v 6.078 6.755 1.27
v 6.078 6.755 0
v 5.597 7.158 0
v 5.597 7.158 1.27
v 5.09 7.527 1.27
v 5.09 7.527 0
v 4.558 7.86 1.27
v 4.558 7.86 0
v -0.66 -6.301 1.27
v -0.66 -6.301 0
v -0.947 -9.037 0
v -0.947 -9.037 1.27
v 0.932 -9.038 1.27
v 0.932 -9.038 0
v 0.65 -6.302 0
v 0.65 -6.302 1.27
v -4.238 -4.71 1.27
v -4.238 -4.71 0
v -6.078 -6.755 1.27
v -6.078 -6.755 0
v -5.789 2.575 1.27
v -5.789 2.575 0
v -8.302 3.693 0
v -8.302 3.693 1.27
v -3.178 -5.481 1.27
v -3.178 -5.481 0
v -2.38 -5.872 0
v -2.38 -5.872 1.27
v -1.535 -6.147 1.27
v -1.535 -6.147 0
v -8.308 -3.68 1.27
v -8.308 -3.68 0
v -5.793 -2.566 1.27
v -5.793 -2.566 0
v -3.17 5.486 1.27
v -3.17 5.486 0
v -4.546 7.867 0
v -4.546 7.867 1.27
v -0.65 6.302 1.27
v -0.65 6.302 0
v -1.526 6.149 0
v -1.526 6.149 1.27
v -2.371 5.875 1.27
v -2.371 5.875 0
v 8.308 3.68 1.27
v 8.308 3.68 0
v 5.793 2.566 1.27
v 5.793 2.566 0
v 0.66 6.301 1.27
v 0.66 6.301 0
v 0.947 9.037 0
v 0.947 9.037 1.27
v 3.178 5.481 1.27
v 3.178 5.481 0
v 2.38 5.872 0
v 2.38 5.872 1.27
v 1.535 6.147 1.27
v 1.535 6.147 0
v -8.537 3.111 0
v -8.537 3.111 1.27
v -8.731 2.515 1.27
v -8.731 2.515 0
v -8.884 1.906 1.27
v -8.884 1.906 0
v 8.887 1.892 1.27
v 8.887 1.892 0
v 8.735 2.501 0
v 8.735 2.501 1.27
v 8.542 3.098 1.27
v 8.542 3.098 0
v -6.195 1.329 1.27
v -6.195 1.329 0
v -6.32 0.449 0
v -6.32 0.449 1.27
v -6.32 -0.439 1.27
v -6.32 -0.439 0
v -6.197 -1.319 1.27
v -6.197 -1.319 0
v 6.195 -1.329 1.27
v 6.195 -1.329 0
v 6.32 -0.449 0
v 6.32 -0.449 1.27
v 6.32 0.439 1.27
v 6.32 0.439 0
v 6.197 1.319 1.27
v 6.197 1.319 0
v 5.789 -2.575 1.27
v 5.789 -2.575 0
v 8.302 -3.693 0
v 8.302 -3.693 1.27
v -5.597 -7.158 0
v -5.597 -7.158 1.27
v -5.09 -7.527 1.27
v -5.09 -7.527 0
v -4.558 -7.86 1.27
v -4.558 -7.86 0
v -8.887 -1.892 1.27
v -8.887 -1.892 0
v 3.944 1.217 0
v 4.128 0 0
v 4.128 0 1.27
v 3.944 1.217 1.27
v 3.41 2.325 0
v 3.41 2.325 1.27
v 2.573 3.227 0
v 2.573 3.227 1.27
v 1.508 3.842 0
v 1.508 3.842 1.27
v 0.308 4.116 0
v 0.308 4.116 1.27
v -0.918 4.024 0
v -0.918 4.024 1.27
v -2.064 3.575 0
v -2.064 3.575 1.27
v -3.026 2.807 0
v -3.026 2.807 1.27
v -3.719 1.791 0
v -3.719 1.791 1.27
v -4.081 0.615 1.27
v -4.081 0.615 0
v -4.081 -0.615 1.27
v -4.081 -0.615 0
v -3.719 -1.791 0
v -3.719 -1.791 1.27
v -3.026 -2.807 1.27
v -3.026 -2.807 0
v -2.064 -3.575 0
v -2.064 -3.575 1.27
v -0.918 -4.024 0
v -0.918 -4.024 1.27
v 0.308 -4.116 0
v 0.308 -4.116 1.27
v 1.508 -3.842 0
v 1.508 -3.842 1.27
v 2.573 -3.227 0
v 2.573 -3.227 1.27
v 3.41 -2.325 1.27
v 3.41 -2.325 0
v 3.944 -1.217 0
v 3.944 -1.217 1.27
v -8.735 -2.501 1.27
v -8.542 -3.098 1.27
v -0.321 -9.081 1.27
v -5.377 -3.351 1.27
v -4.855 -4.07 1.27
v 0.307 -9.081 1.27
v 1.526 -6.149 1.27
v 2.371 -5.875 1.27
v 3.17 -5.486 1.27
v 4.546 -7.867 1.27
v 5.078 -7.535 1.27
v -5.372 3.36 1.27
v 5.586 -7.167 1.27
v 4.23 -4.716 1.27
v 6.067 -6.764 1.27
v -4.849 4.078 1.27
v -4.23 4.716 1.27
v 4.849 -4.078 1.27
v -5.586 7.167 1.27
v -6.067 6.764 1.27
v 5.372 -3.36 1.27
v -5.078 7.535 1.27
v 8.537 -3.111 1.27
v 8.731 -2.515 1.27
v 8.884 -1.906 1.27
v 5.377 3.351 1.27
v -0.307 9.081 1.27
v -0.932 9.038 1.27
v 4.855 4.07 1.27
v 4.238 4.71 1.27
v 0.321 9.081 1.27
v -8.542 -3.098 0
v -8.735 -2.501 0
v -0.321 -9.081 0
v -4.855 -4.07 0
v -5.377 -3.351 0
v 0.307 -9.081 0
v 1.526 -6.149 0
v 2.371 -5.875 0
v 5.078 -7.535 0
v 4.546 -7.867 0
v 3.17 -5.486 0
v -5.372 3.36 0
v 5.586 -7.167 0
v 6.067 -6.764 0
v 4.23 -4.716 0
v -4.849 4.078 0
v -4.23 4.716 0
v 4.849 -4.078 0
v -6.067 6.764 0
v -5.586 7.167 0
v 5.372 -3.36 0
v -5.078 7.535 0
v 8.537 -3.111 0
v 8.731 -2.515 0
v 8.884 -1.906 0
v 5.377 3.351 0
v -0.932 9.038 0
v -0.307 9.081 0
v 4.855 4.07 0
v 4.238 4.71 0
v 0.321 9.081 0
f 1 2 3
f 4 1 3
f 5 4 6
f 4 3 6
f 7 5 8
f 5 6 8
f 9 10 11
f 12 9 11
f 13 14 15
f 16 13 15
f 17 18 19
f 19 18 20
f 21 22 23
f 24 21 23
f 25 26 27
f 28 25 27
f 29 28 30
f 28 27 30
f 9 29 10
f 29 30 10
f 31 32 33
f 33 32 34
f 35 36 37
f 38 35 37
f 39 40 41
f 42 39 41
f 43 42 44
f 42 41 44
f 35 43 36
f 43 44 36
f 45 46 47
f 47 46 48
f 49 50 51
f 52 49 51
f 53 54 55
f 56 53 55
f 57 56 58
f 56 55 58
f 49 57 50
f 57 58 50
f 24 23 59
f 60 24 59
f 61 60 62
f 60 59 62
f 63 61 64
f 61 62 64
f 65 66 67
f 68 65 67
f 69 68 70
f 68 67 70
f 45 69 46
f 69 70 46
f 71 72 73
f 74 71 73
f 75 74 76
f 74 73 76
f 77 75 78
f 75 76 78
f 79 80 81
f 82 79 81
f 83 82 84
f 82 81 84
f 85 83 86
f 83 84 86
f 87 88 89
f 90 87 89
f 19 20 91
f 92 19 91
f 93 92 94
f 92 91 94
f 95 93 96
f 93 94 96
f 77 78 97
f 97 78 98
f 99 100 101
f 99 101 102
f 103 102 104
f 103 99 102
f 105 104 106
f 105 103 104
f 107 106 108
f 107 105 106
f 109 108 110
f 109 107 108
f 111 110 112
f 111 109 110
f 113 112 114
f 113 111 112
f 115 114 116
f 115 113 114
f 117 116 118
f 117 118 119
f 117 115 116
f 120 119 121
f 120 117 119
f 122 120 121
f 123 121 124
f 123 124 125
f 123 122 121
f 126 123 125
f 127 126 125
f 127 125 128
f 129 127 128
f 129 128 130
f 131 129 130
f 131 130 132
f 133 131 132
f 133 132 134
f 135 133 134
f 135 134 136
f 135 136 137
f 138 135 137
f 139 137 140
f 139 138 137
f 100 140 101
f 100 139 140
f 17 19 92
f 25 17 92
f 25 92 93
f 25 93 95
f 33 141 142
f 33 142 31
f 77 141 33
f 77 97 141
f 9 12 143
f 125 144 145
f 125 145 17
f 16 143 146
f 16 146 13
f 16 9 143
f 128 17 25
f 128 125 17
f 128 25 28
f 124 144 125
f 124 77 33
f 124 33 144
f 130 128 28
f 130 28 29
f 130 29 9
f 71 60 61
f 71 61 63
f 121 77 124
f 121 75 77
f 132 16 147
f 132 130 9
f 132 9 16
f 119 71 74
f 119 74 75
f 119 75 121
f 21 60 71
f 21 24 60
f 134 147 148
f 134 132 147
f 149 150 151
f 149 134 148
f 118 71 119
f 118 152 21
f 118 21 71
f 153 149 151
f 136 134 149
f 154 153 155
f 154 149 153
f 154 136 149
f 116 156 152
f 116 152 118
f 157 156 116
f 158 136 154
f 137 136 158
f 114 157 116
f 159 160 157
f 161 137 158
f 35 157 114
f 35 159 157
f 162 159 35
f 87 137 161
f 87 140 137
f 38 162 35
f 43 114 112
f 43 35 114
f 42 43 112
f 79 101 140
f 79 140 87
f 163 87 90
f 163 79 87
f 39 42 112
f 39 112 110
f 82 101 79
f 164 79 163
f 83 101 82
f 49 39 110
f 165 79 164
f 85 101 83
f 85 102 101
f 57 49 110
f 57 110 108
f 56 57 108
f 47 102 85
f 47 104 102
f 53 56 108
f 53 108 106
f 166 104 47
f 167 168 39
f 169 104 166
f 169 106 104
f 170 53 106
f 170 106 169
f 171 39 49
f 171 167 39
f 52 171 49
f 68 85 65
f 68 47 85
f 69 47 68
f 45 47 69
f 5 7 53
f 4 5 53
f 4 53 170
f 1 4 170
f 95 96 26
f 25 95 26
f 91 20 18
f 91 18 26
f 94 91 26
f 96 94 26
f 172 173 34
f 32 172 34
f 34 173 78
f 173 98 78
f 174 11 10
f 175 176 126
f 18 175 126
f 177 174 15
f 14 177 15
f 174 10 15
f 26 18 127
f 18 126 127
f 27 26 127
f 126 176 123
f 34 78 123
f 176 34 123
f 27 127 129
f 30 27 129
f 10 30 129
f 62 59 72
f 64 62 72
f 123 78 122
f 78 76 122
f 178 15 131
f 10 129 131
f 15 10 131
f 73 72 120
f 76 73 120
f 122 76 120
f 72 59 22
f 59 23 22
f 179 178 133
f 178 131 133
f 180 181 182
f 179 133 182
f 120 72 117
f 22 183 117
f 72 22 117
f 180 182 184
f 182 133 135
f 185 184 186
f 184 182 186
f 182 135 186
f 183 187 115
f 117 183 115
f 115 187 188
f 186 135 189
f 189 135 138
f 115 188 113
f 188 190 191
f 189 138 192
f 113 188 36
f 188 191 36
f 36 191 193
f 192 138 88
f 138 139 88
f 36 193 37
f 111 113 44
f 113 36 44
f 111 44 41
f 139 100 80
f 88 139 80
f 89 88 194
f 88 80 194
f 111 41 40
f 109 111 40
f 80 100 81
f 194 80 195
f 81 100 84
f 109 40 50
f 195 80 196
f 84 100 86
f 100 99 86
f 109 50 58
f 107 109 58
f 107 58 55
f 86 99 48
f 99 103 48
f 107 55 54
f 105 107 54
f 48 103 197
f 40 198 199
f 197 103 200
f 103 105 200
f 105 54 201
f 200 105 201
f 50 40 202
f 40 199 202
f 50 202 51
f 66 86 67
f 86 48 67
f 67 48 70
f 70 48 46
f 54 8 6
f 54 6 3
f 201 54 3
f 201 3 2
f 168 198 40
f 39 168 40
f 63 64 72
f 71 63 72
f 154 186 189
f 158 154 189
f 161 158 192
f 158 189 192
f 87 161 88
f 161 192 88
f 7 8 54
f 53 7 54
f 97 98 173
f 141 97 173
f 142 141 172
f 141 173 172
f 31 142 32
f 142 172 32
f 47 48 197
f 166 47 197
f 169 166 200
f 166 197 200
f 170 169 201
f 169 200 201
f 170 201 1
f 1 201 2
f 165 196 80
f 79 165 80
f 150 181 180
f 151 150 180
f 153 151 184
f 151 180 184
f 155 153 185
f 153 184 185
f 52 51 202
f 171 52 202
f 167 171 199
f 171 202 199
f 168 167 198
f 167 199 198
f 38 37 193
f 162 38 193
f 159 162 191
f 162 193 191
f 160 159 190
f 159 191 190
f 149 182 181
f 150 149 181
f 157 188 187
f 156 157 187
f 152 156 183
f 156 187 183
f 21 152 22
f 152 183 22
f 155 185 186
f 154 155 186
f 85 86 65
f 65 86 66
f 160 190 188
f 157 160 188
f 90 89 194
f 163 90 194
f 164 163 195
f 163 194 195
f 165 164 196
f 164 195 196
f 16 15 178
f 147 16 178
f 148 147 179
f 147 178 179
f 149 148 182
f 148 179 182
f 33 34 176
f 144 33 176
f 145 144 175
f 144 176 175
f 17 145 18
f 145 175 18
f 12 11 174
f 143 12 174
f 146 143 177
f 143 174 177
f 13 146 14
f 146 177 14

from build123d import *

# Parameters (mm, degrees)
SKETCH1_R           = 4.1275
BOSS_EXTRUDE1_DEPTH = 1.27


with BuildPart() as part:
    # Sketch1 → Boss-Extrude1 (new body)
    with BuildSketch(Plane.XY):
        with BuildLine():
            Line((-0.66010495, -6.301124731), (-0.946700317, -9.036861149))
            ThreePointArc((-0.946700317, -9.036861149), (-0.007173127, -9.086311103), (0.932430967, -9.038344617))
            Line((0.932430967, -9.038344617), (0.650155372, -6.302159107))
            ThreePointArc((0.650155372, -6.302159107), (1.953052705, -6.027063676), (3.169672067, -5.485716945))
            Line((3.169672067, -5.485716945), (4.545837066, -7.86743073))
            ThreePointArc((4.545837066, -7.86743073), (5.334996482, -7.355196357), (6.066958169, -6.764105225))
            Line((6.066958169, -6.764105225), (4.230302926, -4.716402079))
            ThreePointArc((4.230302926, -4.716402079), (5.122671972, -3.728021363), (5.788742087, -2.57495174))
            Line((5.788742087, -2.57495174), (8.302019196, -3.692909176))
            ThreePointArc((8.302019196, -3.692909176), (8.639378766, -2.814646597), (8.884113559, -1.906207541))
            Line((8.884113559, -1.906207541), (6.194618544, -1.329139762))
            ThreePointArc((6.194618544, -1.329139762), (6.335604659, -0.005001601), (6.196709383, 1.319357511))
            Line((6.196709383, 1.319357511), (8.887112169, 1.892178166))
            ThreePointArc((8.887112169, 1.892178166), (8.643812002, 2.801002498), (8.30783953, 3.679796635))
            Line((8.30783953, 3.679796635), (5.792800426, 2.565808769))
            ThreePointArc((5.792800426, 2.565808769), (5.128551706, 3.719928603), (4.237744312, 4.709717036))
            Line((4.237744312, 4.709717036), (6.077630355, 6.754517761))
            ThreePointArc((6.077630355, 6.754517761), (5.346602846, 7.34676384), (4.558253173, 7.860243567))
            Line((4.558253173, 7.860243567), (3.178329436, 5.480705558))
            ThreePointArc((3.178329436, 5.480705558), (1.962566314, 6.023972516), (0.66010495, 6.301124731))
            Line((0.66010495, 6.301124731), (0.946700317, 9.036861149))
            ThreePointArc((0.946700317, 9.036861149), (0.007173127, 9.086311103), (-0.932430967, 9.038344617))
            Line((-0.932430967, 9.038344617), (-0.650155372, 6.302159107))
            ThreePointArc((-0.650155372, 6.302159107), (-1.953052705, 6.027063676), (-3.169672067, 5.485716945))
            Line((-3.169672067, 5.485716945), (-4.545837066, 7.86743073))
            ThreePointArc((-4.545837066, 7.86743073), (-5.334996482, 7.355196357), (-6.066958169, 6.764105225))
            Line((-6.066958169, 6.764105225), (-4.230302926, 4.716402079))
            ThreePointArc((-4.230302926, 4.716402079), (-5.122671972, 3.728021363), (-5.788742087, 2.57495174))
            Line((-5.788742087, 2.57495174), (-8.302019196, 3.692909176))
            ThreePointArc((-8.302019196, 3.692909176), (-8.639378766, 2.814646597), (-8.884113559, 1.906207541))
            Line((-8.884113559, 1.906207541), (-6.194618544, 1.329139762))
            ThreePointArc((-6.194618544, 1.329139762), (-6.335604659, 0.005001601), (-6.196709383, -1.319357511))
            Line((-6.196709383, -1.319357511), (-8.887112169, -1.892178166))
            ThreePointArc((-8.887112169, -1.892178166), (-8.643812002, -2.801002498), (-8.30783953, -3.679796635))
            Line((-8.30783953, -3.679796635), (-5.792800426, -2.565808769))
            ThreePointArc((-5.792800426, -2.565808769), (-5.128551706, -3.719928603), (-4.237744312, -4.709717036))
            Line((-4.237744312, -4.709717036), (-6.077630355, -6.754517761))
            ThreePointArc((-6.077630355, -6.754517761), (-5.346602846, -7.34676384), (-4.558253173, -7.860243567))
            Line((-4.558253173, -7.860243567), (-3.178329436, -5.480705558))
            ThreePointArc((-3.178329436, -5.480705558), (-1.962566314, -6.023972516), (-0.66010495, -6.301124731))
        make_face()
        Circle(SKETCH1_R, mode=Mode.SUBTRACT)
    extrude(amount=BOSS_EXTRUDE1_DEPTH)


solid = part.part
